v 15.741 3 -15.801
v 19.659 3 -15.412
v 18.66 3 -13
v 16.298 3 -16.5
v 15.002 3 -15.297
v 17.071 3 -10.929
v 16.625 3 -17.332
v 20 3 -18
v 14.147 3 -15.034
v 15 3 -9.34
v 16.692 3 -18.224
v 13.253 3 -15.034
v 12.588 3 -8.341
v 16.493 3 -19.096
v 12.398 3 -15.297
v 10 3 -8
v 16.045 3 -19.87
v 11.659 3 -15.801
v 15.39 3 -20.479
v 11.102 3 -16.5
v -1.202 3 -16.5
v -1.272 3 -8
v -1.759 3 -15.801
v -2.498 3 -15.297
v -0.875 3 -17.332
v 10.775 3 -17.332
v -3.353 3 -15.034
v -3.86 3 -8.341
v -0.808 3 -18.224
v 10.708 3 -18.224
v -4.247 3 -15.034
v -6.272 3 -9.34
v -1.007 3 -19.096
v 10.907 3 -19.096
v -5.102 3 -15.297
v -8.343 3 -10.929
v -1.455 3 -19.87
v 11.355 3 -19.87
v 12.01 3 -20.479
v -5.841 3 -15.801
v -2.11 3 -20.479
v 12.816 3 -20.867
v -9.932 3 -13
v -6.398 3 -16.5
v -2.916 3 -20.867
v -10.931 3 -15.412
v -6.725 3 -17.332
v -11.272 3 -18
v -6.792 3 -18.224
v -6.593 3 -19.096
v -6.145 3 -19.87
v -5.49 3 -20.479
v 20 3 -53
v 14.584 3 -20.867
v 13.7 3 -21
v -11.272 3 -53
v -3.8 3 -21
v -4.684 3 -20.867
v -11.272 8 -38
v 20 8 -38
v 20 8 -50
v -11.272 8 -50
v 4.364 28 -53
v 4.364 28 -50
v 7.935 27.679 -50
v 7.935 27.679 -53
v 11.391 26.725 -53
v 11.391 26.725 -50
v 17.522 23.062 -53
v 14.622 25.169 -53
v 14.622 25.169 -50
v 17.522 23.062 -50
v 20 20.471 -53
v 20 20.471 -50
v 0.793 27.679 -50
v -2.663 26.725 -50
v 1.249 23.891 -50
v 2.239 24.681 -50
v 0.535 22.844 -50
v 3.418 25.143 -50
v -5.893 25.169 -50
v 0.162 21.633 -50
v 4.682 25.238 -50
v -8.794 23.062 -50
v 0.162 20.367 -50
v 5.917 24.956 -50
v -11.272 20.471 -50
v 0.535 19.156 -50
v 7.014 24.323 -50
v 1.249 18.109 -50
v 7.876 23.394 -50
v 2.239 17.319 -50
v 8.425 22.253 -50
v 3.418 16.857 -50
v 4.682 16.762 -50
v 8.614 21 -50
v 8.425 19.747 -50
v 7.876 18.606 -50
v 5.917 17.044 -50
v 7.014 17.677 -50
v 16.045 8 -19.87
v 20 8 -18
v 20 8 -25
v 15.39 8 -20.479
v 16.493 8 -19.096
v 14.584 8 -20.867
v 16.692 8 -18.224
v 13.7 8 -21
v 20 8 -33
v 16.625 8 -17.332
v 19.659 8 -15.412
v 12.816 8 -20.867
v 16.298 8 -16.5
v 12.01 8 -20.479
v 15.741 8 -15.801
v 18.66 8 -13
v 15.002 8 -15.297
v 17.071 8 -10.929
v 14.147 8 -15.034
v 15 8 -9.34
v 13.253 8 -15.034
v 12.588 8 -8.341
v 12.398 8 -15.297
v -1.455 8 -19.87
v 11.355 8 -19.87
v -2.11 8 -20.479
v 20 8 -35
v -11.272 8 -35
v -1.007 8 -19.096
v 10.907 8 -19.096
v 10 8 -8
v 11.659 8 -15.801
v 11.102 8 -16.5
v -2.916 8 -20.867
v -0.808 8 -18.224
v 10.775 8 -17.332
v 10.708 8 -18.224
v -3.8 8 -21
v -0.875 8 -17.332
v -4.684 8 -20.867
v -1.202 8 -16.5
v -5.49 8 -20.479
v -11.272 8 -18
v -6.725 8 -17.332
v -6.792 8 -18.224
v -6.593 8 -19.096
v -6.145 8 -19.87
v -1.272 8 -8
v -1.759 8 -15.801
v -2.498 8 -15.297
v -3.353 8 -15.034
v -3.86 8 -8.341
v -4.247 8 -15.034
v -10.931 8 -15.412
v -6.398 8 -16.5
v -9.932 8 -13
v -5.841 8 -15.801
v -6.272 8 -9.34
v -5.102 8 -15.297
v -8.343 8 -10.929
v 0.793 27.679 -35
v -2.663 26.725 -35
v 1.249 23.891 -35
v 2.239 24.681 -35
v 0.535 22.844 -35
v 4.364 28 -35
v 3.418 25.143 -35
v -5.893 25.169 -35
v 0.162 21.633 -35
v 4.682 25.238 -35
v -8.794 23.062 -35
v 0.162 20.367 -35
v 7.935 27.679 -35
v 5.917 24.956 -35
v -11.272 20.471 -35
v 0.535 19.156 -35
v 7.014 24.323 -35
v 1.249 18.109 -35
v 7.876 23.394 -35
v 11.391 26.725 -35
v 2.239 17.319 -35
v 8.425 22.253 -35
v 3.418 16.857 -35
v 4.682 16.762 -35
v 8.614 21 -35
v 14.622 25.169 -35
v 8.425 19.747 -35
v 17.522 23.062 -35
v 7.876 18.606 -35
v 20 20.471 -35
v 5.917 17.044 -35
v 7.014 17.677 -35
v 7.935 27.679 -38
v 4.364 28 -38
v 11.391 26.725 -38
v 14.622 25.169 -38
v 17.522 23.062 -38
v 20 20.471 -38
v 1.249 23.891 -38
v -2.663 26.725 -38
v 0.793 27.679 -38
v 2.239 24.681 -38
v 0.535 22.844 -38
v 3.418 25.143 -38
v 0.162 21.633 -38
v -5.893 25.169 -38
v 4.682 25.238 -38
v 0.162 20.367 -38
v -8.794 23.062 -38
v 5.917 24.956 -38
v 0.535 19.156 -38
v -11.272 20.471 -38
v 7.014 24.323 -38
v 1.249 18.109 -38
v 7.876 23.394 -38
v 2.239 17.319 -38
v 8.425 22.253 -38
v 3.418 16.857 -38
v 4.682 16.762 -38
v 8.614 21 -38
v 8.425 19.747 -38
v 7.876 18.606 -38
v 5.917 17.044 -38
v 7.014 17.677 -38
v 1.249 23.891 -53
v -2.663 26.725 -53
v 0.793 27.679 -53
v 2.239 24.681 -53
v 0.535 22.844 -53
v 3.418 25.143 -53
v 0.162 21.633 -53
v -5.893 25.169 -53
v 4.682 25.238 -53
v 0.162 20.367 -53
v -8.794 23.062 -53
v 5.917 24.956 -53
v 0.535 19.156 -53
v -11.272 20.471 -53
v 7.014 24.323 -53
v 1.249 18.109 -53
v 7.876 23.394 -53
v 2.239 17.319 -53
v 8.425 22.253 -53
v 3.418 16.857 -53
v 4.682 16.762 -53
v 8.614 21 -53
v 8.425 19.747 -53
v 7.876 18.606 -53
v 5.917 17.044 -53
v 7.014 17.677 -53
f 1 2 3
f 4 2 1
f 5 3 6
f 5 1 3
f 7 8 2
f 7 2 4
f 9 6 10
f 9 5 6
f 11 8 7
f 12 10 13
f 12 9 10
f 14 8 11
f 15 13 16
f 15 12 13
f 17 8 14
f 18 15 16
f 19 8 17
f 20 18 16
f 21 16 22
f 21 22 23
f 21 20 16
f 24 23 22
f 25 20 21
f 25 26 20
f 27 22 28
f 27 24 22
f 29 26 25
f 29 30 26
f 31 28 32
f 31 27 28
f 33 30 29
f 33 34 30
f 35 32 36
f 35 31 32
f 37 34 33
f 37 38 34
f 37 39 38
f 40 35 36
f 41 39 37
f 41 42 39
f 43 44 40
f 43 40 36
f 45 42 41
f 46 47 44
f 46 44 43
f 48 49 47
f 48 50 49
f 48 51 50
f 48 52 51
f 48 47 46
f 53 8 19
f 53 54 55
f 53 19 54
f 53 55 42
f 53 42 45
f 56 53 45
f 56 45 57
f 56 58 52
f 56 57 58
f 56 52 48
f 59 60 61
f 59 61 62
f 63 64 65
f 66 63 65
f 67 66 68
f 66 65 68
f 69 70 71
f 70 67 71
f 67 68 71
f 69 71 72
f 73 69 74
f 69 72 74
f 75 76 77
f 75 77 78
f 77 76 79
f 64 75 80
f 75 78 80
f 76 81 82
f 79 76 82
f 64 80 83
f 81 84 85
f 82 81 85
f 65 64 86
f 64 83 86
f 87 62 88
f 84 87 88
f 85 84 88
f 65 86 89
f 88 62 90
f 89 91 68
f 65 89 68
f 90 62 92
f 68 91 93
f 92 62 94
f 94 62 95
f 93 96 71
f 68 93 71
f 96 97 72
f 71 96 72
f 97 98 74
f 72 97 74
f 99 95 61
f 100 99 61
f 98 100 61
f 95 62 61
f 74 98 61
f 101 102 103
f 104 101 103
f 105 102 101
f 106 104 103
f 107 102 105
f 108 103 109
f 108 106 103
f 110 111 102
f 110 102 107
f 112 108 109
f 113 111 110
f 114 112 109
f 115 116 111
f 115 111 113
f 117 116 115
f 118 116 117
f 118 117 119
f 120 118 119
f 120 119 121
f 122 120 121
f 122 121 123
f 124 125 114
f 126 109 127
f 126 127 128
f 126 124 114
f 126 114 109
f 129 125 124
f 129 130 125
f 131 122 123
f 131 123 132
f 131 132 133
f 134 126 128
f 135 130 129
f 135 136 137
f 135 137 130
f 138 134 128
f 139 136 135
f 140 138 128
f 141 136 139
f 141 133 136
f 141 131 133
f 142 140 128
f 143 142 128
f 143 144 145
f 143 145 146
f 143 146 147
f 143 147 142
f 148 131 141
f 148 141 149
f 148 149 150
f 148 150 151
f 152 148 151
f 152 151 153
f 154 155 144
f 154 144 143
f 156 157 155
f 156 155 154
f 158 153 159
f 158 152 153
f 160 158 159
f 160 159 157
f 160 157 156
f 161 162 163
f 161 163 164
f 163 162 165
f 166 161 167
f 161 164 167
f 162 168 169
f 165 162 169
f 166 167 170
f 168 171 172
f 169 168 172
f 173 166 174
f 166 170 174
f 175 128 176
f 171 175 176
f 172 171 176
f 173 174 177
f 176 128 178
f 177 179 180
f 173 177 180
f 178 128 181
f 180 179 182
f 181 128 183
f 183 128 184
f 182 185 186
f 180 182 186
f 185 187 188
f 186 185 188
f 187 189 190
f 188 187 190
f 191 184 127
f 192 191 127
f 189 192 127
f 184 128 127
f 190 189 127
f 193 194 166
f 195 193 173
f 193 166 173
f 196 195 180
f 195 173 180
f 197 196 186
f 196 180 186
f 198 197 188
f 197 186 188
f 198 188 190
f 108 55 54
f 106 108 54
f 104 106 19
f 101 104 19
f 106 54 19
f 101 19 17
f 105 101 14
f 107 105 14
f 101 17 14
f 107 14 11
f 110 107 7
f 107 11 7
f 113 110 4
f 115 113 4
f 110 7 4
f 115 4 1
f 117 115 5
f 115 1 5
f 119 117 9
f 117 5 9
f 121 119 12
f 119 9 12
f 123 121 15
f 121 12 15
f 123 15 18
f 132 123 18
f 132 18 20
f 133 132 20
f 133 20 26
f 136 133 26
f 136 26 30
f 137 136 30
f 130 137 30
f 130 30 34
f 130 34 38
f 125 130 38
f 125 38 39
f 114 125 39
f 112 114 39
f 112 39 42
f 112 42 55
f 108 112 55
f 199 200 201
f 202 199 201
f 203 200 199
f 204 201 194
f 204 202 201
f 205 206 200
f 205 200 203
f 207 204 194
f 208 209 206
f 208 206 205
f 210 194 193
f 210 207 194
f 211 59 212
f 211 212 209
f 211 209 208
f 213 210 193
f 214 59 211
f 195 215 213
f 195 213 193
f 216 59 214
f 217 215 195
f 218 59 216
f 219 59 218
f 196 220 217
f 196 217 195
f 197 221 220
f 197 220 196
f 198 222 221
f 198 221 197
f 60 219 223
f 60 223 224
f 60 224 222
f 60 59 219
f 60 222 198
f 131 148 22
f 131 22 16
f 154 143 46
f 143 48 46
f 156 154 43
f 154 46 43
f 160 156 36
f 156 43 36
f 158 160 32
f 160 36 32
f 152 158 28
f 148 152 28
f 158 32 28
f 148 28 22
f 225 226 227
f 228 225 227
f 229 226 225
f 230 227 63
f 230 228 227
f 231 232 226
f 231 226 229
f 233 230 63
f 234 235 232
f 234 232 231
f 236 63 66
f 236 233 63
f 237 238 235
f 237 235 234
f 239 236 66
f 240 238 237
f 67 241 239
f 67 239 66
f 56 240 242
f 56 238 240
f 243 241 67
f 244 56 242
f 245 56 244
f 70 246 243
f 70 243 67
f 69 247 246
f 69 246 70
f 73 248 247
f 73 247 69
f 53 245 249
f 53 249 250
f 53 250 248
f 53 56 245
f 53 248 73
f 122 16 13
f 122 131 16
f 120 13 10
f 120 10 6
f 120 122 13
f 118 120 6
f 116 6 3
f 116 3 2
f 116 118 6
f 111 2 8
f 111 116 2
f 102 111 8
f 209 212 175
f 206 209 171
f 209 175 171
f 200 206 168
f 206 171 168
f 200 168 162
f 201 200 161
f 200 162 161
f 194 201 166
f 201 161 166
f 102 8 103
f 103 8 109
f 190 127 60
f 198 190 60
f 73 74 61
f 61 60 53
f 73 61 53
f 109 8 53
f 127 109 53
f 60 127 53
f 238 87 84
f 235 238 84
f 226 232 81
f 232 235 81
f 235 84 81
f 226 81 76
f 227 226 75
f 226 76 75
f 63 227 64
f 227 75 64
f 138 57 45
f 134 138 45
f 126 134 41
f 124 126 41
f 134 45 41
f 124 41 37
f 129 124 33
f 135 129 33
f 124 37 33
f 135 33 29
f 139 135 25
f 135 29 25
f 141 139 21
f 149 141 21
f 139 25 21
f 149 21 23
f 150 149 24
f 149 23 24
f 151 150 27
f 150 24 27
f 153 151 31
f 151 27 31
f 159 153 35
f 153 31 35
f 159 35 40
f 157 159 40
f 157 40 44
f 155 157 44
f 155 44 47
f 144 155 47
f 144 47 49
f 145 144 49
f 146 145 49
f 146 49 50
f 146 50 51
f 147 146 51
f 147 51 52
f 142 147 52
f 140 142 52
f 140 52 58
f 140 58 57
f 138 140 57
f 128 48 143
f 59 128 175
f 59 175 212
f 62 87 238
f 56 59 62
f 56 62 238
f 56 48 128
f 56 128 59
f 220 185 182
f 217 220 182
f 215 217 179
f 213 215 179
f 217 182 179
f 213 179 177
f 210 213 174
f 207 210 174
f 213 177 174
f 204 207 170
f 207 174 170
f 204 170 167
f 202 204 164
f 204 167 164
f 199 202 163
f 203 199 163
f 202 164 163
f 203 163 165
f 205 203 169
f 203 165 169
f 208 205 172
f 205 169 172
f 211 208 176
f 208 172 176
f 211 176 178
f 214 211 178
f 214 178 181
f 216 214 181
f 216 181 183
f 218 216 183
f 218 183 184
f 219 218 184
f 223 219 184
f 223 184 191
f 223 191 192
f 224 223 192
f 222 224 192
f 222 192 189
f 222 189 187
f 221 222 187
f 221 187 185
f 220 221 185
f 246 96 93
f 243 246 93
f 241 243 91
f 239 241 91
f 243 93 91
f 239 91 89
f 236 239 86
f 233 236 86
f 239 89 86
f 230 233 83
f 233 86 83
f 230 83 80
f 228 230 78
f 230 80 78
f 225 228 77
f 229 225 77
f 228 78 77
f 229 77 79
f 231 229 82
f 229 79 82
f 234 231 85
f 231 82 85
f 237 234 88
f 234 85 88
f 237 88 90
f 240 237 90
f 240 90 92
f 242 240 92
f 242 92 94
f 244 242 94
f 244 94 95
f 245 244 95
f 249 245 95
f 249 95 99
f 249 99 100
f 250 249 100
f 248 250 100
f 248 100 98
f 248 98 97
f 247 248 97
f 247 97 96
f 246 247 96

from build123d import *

# Parameters (mm, degrees)
BOSS_EXTRUDE1_OUTLINE_R     = 3.500000003
BOSS_EXTRUDE1_OUTLINE_R_2   = 3.500000005
BOSS_EXTRUDE1_DEPTH         = 8
BOSS_EXTRUDE1_START         = 8
BOSS_EXTRUDE1_2_DEPTH       = 13
BOSS_EXTRUDE1_START_2       = 20.176470589
BOSS_EXTRUDE1_3_OUTLINE_W   = 15
BOSS_EXTRUDE1_3_OUTLINE_H   = 8
BOSS_EXTRUDE1_3_DEPTH       = 29.823529411
BOSS_EXTRUDE1_4_DEPTH       = 14.823529411
BOSS_EXTRUDE1_5_OUTLINE_R   = 1.75
BOSS_EXTRUDE1_5_OUTLINE_R_2 = 3.500000003
BOSS_EXTRUDE1_5_OUTLINE_R_3 = 1.749999996
BOSS_EXTRUDE1_5_OUTLINE_R_4 = 3.500000005
BOSS_EXTRUDE1_5_OUTLINE_R_5 = 1.749999999
BOSS_EXTRUDE1_5_DEPTH       = 4
BOSS_EXTRUDE1_START_3       = -34
BOSS_EXTRUDE1_6_OUTLINE_R   = 1.749999996
BOSS_EXTRUDE1_6_DEPTH       = 9
BOSS_EXTRUDE1_START_4       = 2.590816236
BOSS_EXTRUDE1_7_DEPTH       = 13.213162803
SKETCH2_W                   = 49.146856184
SKETCH2_H                   = 24.85114674
CUT_EXTRUDE1_DEPTH          = 20
SKETCH4_R                   = 5.607924621
SKETCH4_R_2                 = 5.608756875
BOSS_EXTRUDE2_DEPTH         = 8
SKETCH5_W                   = 3
SKETCH5_H                   = 8
BOSS_EXTRUDE3_DEPTH         = 17
SKETCH6_R                   = 3.5
CUT_EXTRUDE2_DEPTH          = 25
CUT_EXTRUDE3_DEPTH          = 59.429444632
CUT_EXTRUDE3_DEPTH_BACK     = 59.429444632
SKETCH7_W                   = 9.630467125
SKETCH7_H                   = 58.787662196
SKETCH8_W                   = 43
SKETCH8_H                   = 25
BOSS_EXTRUDE4_DEPTH         = 8
SKETCH9_W                   = 43
SKETCH9_H                   = 25
CUT_EXTRUDE6_DEPTH          = 11
SKETCH10_R                  = 3
CUT_EXTRUDE7_DEPTH          = 10
SKETCH11_W                  = 44.092215153
SKETCH11_H                  = 53.727113244
CUT_EXTRUDE8_DEPTH          = 10
SKETCH13_W                  = 11.72841244
SKETCH13_H                  = 25
CUT_EXTRUDE9_DEPTH          = 10
SKETCH14_W                  = 31.27158756
SKETCH14_H                  = 8
BOSS_EXTRUDE5_DEPTH         = 20
SKETCH15_W                  = 31.27158756
SKETCH15_H                  = 3
BOSS_EXTRUDE6_DEPTH         = 20
SKETCH16_R                  = 4.25
CUT_EXTRUDE12_DEPTH         = 20
SKETCH17_W                  = 31.27158756
SKETCH17_H                  = 45
CUT_EXTRUDE13_DEPTH         = 3
FILLET1_R                   = 10


with BuildPart() as part:
    # Boss-Extrude1: read off the stored shape, not the designer's step
    # Boss-Extrude1 outline → Boss-Extrude1 (new body)
    with BuildSketch(Plane(origin=(0, 0, 0), x_dir=(1, 0, 0), z_dir=(0, 1, 0))):
        with BuildLine():
            ThreePointArc((-3.5, -5), (0, -1.5), (3.5, -5))
            Line((3.5, -5), (3.5, -8))
            Line((3.5, -8), (4, -8))
            Line((4, -8), (25, 13.000000001))
            Line((25, 13.000000001), (25, 33))
            Line((25, 33), (-23, 33))
            Line((-23, 33), (-23, 25))
            Line((-23, 25), (-20, 25))
            Line((-20, 25), (-20, 8))
            Line((-20, 8), (-4, -8))
            Line((-4, -8), (-3.5, -8))
            Line((-3.5, -8), (-3.5, -5))
        make_face()
        with Locations((-10, 15)):
            Circle(BOSS_EXTRUDE1_OUTLINE_R, mode=Mode.SUBTRACT)
        with Locations((10, 15)):
            Circle(BOSS_EXTRUDE1_OUTLINE_R_2, mode=Mode.SUBTRACT)
    extrude(amount=BOSS_EXTRUDE1_DEPTH)

    # Boss-Extrude1 2 outline → Boss-Extrude1 2 (add)
    with BuildSketch(Plane(origin=(0, 0, 0), x_dir=(1, 0, 0), z_dir=(0, 1, 0)).offset(BOSS_EXTRUDE1_START)):
        Polygon((20, 25), (20, 8), (25, 13.000000001), (25, 33), (-23, 33), (-23, 25), align=None)
    extrude(amount=BOSS_EXTRUDE1_2_DEPTH)

    # Boss-Extrude1 3 outline → Boss-Extrude1 3 (add)
    with BuildSketch(Plane(origin=(0, 0, 0), x_dir=(1, 0, 0), z_dir=(0, 1, 0)).offset(BOSS_EXTRUDE1_START_2)):
        with Locations((17.5, 29)):
            Rectangle(BOSS_EXTRUDE1_3_OUTLINE_W, BOSS_EXTRUDE1_3_OUTLINE_H)
    extrude(amount=BOSS_EXTRUDE1_3_DEPTH)

    # Boss-Extrude1 4 outline → Boss-Extrude1 4 (add)
    with BuildSketch(Plane(origin=(0, 0, 0), x_dir=(1, 0, 0), z_dir=(0, 1, 0)).offset(BOSS_EXTRUDE1_START_2)):
        Polygon((20, 25), (20, 8), (25, 13.000000001), (25, 25), align=None)
    extrude(amount=BOSS_EXTRUDE1_4_DEPTH)

    # Boss-Extrude1 5 outline → Boss-Extrude1 5 (add)
    # profile 1 of 3: a face of its own
    with BuildSketch(Plane(origin=(0, 0, 0), x_dir=(1, 0, 0), z_dir=(0, 1, 0))):
        with BuildLine():
            Line((3.5, -8), (3.5, -5))
            ThreePointArc((3.5, -5), (0, -1.5), (-3.5, -5))
            Line((-3.5, -5), (-3.5, -8))
            Line((-3.5, -8), (3.5, -8))
        make_face()
        with Locations((0, -5)):
            Circle(BOSS_EXTRUDE1_5_OUTLINE_R, mode=Mode.SUBTRACT)
    # profile 2 of 3: a face of its own
    with BuildSketch(Plane(origin=(0, 0, 0), x_dir=(1, 0, 0), z_dir=(0, 1, 0))):
        with Locations((-10, 15)):
            Circle(BOSS_EXTRUDE1_5_OUTLINE_R_2)
        with Locations((-10, 15)):
            Circle(BOSS_EXTRUDE1_5_OUTLINE_R_3, mode=Mode.SUBTRACT)
    # profile 3 of 3: a face of its own
    with BuildSketch(Plane(origin=(0, 0, 0), x_dir=(1, 0, 0), z_dir=(0, 1, 0))):
        with Locations((10, 15)):
            Circle(BOSS_EXTRUDE1_5_OUTLINE_R_4)
        with Locations((10, 15)):
            Circle(BOSS_EXTRUDE1_5_OUTLINE_R_5, mode=Mode.SUBTRACT)
    extrude(amount=BOSS_EXTRUDE1_5_DEPTH)

    # Boss-Extrude1 6 outline → Boss-Extrude1 6 (cut)
    with BuildSketch(Plane.XY.offset(BOSS_EXTRUDE1_START_3)):
        with BuildLine():
            Line((-20.000000002, 18), (7, 18))
            ThreePointArc((7, 18), (9.121320344, 18.878679656), (10, 21))
            Line((10, 21), (-23, 21))
            Line((-23, 21), (-23, 15.000000003))
            Line((-23, 15.000000003), (-20.000000002, 18))
        make_face()
        Polygon((25, 50), (20, 50), (25, 42), align=None)
        Polygon((10, 50), (10, 46.999999997), (13.000000003, 49.999999997), align=None)
        with Locations((14.5, 13.5)):
            Circle(BOSS_EXTRUDE1_6_OUTLINE_R)
        with Locations((-16.5, 13.5)):
            Circle(BOSS_EXTRUDE1_6_OUTLINE_R)
        with Locations((14.5, 44.5)):
            Circle(BOSS_EXTRUDE1_6_OUTLINE_R)
    extrude(amount=BOSS_EXTRUDE1_6_DEPTH, mode=Mode.SUBTRACT)

    # Boss-Extrude1 7 outline → Boss-Extrude1 7 (cut)
    with BuildSketch(Plane(origin=(0, 0, 0), x_dir=(1, 0, 0), z_dir=(0, 0.6291982286909779, 0.7772448706888557)).offset(BOSS_EXTRUDE1_START_4)):
        Polygon((20, 15.915014019), (25, 23.861635248), (25, 42.933526191), (20, 42.933526191), align=None)
    extrude(amount=BOSS_EXTRUDE1_7_DEPTH, mode=Mode.SUBTRACT)

    # Sketch2 → Cut-Extrude1 (cut)
    with BuildSketch(Plane(origin=(0, 0, 0), x_dir=(-1, 0, 0), z_dir=(0, -1, 0))):
        with Locations((-4.573428092, -4.42557337)):
            Rectangle(SKETCH2_W, SKETCH2_H)
    extrude(amount=-CUT_EXTRUDE1_DEPTH, mode=Mode.SUBTRACT)

    # Sketch4 → Boss-Extrude2 (add, through all)
    with BuildSketch(Plane(origin=(0, 8, 0), x_dir=(1, 0, 0), z_dir=(0, 1, 0))):
        with Locations(Location((-10, 15, 0), (0, 0, 270))):
            Circle(SKETCH4_R)
        with Locations(Location((10, 15, 0), (0, 0, 270))):
            Circle(SKETCH4_R_2)
    extrude(amount=-BOSS_EXTRUDE2_DEPTH)

    # Sketch5 → Boss-Extrude3 (add)
    with BuildSketch(Plane.XY.offset(-25)):
        with Locations((-21.5, 4)):
            Rectangle(SKETCH5_W, SKETCH5_H)
    extrude(amount=BOSS_EXTRUDE3_DEPTH)

    # Sketch6 → Cut-Extrude2 (cut)
    with BuildSketch(Plane(origin=(0, 8, 0), x_dir=(1, 0, 0), z_dir=(0, 1, 0))):
        with Locations(Location((-14.7, 16.3, 0), (0, 0, 270))):
            Circle(SKETCH6_R)
        with Locations(Location((2.8, 16.3, 0), (0, 0, 270))):
            Circle(SKETCH6_R)
    extrude(amount=-CUT_EXTRUDE2_DEPTH, mode=Mode.SUBTRACT)

    # Sketch7 → Cut-Extrude3 (cut, two sides: drawn at the far end of the back side and taken through both)
    with BuildSketch(Plane.XY.offset(-25).offset(-CUT_EXTRUDE3_DEPTH_BACK)):
        with Locations((24.815233563, 20.606168902)):
            Rectangle(SKETCH7_W, SKETCH7_H)
    extrude(amount=CUT_EXTRUDE3_DEPTH + CUT_EXTRUDE3_DEPTH_BACK, mode=Mode.SUBTRACT)

    # Sketch8 → Boss-Extrude4 (add)
    with BuildSketch(Plane(origin=(0, 0, 0), x_dir=(-1, 0, 0), z_dir=(0, -1, 0))):
        with Locations((1.5, 20.5)):
            Rectangle(SKETCH8_W, SKETCH8_H)
    extrude(amount=-BOSS_EXTRUDE4_DEPTH)

    # Sketch9 → Cut-Extrude6 (cut)
    with BuildSketch(Plane(origin=(0, 0, 0), x_dir=(-1, 0, 0), z_dir=(0, -1, 0))):
        with Locations((1.5, 20.5)):
            Rectangle(SKETCH9_W, SKETCH9_H)
    extrude(amount=CUT_EXTRUDE6_DEPTH, mode=Mode.SUBTRACT)

    # Sketch10 → Cut-Extrude7 (cut)
    with BuildSketch(Plane(origin=(0, 0, 0), x_dir=(-1, 0, 0), z_dir=(0, -1, 0))):
        with Locations(Location((-13.7, 18, 0), (0, 0, 90))):
            Circle(SKETCH10_R)
        with Locations(Location((3.8, 18, 0), (0, 0, 90))):
            Circle(SKETCH10_R)
    extrude(amount=-CUT_EXTRUDE7_DEPTH, mode=Mode.SUBTRACT)

    # Sketch11 → Cut-Extrude8 (cut)
    with BuildSketch(Plane.XY.offset(-25)):
        with Locations((-2.046107577, 34.863556622)):
            Rectangle(SKETCH11_W, SKETCH11_H)
    extrude(amount=-CUT_EXTRUDE8_DEPTH, mode=Mode.SUBTRACT)

    # Sketch13 → Cut-Extrude9 (cut)
    with BuildSketch(Plane(origin=(0, 8, 0), x_dir=(1, 0, 0), z_dir=(0, 1, 0))):
        with Locations((-17.13579378, 20.5)):
            Rectangle(SKETCH13_W, SKETCH13_H)
    extrude(amount=-CUT_EXTRUDE9_DEPTH, mode=Mode.SUBTRACT)

    # Sketch14 → Boss-Extrude5 (add)
    with BuildSketch(Plane(origin=(0, 0, -33), x_dir=(-1, 0, 0), z_dir=(0, 0, -1))):
        with Locations((-4.36420622, 4)):
            Rectangle(SKETCH14_W, SKETCH14_H)
    extrude(amount=BOSS_EXTRUDE5_DEPTH)

    # Sketch15 → Boss-Extrude6 (add)
    with BuildSketch(Plane(origin=(0, 8, 0), x_dir=(1, 0, 0), z_dir=(0, 1, 0))):
        with Locations((4.36420622, 51.5)):
            Rectangle(SKETCH15_W, SKETCH15_H)
        with Locations((4.36420622, 36.5)):
            Rectangle(SKETCH15_W, SKETCH15_H)
    extrude(amount=BOSS_EXTRUDE6_DEPTH)

    # Sketch16 → Cut-Extrude12 (cut)
    with BuildSketch(Plane.XY.offset(-35)):
        with Locations((4.36420622, 21)):
            Circle(SKETCH16_R)
        with BuildLine():
            Line((20, 20.470844112), (31.027362531, 31.498206643))
            Line((31.027362531, 31.498206643), (10.435744992, 49.378328991))
            Line((10.435744992, 49.378328991), (-8.588152436, 51.031027656))
            Line((-8.588152436, 51.031027656), (-22.41621992, 31.498206643))
            Line((-22.41621992, 31.498206643), (-11.27158756, 20.470844112))
            ThreePointArc((-11.27158756, 20.470844112), (-4.31286465, 26.019668175), (4.36420622, 28))
            ThreePointArc((4.36420622, 28), (13.04127709, 26.019668175), (20, 20.470844112))
        make_face()
    extrude(amount=-CUT_EXTRUDE12_DEPTH, mode=Mode.SUBTRACT)

    # Sketch17 → Cut-Extrude13 (cut)
    with BuildSketch(Plane(origin=(0, 0, 0), x_dir=(-1, 0, 0), z_dir=(0, -1, 0))):
        with Locations((-4.36420622, 30.5)):
            Rectangle(SKETCH17_W, SKETCH17_H)
    extrude(amount=-CUT_EXTRUDE13_DEPTH, mode=Mode.SUBTRACT)

    # Fillet1
    fillet1_edges = [part.edges().sort_by_distance(p)[0] for p in [
        (-11.27158756, 5.5, -8),
        (19.999999999, 5.5, -8),
    ]]
    fillet(fillet1_edges, radius=FILLET1_R)


solid = part.part
